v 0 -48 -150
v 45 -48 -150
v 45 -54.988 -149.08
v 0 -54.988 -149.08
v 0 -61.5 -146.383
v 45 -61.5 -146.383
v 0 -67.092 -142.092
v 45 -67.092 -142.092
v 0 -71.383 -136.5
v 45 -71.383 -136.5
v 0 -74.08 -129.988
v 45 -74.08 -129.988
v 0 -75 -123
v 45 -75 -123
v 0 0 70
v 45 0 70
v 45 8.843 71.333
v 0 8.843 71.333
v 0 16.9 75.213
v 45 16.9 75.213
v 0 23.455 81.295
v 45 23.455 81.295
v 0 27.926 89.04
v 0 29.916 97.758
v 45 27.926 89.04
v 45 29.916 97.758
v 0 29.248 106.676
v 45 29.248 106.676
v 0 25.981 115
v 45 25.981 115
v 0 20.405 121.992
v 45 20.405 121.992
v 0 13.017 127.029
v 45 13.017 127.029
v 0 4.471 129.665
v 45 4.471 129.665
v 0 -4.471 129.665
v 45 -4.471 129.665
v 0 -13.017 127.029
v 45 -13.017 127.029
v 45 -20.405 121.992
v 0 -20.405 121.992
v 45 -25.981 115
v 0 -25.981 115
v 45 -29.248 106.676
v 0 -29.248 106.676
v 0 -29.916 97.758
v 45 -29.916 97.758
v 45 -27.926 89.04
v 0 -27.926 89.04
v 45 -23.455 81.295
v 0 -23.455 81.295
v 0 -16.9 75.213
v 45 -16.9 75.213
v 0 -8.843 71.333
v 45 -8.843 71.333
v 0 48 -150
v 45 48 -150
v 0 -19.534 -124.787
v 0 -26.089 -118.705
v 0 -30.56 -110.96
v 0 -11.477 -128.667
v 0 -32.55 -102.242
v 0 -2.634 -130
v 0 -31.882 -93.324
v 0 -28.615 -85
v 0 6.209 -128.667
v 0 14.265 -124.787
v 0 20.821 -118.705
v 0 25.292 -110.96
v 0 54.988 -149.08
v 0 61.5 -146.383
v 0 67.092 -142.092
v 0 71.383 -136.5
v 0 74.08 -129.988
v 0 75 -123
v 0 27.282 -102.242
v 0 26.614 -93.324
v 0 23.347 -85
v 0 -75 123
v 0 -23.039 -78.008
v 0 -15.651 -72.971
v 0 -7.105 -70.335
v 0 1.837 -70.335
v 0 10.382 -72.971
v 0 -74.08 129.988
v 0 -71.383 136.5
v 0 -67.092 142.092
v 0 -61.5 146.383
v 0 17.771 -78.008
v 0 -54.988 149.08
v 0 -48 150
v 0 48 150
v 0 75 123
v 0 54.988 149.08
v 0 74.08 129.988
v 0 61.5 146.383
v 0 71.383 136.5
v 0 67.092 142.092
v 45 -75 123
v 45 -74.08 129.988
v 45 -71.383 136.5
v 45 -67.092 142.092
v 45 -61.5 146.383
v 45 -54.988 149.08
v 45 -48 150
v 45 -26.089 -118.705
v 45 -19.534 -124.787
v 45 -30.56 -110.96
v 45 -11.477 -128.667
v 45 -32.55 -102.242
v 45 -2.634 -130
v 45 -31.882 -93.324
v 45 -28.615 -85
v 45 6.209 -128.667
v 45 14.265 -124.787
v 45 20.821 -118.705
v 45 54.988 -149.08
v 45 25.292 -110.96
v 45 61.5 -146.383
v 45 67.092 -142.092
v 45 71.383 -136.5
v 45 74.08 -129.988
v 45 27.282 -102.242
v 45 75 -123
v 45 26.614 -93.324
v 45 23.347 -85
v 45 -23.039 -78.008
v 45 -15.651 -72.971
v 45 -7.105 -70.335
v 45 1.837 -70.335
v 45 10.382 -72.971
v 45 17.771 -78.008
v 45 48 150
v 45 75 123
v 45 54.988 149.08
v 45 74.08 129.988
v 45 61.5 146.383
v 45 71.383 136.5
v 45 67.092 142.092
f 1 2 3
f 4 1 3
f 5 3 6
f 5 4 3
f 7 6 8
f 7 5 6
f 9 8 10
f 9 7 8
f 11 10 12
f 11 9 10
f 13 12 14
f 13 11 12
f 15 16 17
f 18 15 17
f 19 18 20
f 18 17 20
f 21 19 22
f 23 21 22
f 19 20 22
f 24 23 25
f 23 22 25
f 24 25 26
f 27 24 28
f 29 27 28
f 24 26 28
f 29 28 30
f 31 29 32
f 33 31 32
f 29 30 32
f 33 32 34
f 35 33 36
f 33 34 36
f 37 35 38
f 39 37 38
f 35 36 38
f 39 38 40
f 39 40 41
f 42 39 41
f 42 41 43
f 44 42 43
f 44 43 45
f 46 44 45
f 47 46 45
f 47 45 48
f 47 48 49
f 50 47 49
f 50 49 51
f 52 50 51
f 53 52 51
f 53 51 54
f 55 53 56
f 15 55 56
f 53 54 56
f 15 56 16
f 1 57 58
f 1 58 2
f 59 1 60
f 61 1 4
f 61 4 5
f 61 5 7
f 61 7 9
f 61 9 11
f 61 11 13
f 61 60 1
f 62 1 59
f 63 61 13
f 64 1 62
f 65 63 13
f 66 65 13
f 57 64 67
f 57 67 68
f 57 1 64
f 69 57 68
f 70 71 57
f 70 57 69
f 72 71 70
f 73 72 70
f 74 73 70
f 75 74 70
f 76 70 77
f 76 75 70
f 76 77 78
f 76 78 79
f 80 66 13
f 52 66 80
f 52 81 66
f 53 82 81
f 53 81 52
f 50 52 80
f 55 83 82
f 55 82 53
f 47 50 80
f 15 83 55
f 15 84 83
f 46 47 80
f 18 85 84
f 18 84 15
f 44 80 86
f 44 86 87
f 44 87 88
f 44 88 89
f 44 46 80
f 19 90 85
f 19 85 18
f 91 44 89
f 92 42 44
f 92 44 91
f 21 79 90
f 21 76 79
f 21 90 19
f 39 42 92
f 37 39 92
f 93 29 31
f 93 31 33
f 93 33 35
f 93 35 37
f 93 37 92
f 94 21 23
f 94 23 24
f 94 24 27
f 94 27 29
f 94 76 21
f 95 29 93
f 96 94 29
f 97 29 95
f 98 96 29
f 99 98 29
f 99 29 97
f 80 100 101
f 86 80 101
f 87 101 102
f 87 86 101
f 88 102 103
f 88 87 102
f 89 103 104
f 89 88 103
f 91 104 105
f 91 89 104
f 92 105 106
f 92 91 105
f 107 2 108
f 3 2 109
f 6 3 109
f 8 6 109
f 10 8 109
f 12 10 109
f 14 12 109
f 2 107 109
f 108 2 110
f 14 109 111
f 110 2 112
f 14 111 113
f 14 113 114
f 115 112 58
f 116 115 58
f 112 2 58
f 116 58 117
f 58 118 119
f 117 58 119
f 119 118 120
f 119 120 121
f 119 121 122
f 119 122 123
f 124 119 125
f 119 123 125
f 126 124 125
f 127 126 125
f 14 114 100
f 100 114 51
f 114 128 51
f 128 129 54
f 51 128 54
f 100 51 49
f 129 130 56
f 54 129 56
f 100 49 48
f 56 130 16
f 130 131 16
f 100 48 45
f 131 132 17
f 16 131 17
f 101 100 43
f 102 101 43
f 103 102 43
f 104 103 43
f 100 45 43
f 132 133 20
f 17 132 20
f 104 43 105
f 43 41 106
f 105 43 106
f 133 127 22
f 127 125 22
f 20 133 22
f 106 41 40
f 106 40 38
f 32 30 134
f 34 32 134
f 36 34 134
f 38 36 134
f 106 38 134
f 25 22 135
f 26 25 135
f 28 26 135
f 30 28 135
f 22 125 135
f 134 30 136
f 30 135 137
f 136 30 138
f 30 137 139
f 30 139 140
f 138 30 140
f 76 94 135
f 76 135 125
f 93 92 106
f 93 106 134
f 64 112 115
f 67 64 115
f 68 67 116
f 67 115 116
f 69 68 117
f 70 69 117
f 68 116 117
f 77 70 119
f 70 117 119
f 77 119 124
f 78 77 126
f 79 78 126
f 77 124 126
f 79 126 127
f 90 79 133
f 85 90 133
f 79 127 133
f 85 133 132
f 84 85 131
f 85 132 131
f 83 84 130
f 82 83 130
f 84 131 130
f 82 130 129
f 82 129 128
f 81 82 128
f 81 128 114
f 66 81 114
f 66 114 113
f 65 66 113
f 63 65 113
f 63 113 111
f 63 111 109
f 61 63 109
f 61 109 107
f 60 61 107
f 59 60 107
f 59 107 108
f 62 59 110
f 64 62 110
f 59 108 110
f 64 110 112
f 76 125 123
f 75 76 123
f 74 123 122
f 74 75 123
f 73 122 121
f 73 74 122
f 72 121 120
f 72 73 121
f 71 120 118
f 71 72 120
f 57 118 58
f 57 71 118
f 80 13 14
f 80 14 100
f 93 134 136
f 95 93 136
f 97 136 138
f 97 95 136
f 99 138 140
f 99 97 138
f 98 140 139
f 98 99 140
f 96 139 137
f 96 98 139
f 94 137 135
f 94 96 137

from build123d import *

# Parameters (mm, degrees)
Y_KSEKLIK_EKSTR_ZYON1_DEPTH = 45
IZIM2_R                     = 30
KES_EKSTR_ZYON2_DEPTH       = 45


with BuildPart() as part:
    # Çizim1 → Yükseklik-Ekstrüzyon1 (new body)
    with BuildSketch(Plane(origin=(0, 0, 0), x_dir=(0, 0, -1), z_dir=(1, 0, 0))):
        with BuildLine():
            Line((-123, 75), (123, 75))
            ThreePointArc((123, 75), (142.091883092, 67.091883092), (150, 48))
            Line((150, 48), (150, -48))
            ThreePointArc((150, -48), (142.091883092, -67.091883092), (123, -75))
            Line((123, -75), (-123, -75))
            ThreePointArc((-123, -75), (-142.091883092, -67.091883092), (-150, -48))
            Line((-150, -48), (-150, 48))
            ThreePointArc((-150, 48), (-142.091883092, 67.091883092), (-123, 75))
        make_face()
    extrude(amount=Y_KSEKLIK_EKSTR_ZYON1_DEPTH)

    # Çizim2 → Kes-Ekstrüzyon2 (cut)
    with BuildSketch(Plane(origin=(45, 0, 0), x_dir=(0, 0, -1), z_dir=(1, 0, 0))):
        with Locations((100, -2.634150603)):
            Circle(IZIM2_R)
        with Locations((-100, 0)):
            Circle(IZIM2_R)
    extrude(amount=-KES_EKSTR_ZYON2_DEPTH, mode=Mode.SUBTRACT)


solid = part.part
